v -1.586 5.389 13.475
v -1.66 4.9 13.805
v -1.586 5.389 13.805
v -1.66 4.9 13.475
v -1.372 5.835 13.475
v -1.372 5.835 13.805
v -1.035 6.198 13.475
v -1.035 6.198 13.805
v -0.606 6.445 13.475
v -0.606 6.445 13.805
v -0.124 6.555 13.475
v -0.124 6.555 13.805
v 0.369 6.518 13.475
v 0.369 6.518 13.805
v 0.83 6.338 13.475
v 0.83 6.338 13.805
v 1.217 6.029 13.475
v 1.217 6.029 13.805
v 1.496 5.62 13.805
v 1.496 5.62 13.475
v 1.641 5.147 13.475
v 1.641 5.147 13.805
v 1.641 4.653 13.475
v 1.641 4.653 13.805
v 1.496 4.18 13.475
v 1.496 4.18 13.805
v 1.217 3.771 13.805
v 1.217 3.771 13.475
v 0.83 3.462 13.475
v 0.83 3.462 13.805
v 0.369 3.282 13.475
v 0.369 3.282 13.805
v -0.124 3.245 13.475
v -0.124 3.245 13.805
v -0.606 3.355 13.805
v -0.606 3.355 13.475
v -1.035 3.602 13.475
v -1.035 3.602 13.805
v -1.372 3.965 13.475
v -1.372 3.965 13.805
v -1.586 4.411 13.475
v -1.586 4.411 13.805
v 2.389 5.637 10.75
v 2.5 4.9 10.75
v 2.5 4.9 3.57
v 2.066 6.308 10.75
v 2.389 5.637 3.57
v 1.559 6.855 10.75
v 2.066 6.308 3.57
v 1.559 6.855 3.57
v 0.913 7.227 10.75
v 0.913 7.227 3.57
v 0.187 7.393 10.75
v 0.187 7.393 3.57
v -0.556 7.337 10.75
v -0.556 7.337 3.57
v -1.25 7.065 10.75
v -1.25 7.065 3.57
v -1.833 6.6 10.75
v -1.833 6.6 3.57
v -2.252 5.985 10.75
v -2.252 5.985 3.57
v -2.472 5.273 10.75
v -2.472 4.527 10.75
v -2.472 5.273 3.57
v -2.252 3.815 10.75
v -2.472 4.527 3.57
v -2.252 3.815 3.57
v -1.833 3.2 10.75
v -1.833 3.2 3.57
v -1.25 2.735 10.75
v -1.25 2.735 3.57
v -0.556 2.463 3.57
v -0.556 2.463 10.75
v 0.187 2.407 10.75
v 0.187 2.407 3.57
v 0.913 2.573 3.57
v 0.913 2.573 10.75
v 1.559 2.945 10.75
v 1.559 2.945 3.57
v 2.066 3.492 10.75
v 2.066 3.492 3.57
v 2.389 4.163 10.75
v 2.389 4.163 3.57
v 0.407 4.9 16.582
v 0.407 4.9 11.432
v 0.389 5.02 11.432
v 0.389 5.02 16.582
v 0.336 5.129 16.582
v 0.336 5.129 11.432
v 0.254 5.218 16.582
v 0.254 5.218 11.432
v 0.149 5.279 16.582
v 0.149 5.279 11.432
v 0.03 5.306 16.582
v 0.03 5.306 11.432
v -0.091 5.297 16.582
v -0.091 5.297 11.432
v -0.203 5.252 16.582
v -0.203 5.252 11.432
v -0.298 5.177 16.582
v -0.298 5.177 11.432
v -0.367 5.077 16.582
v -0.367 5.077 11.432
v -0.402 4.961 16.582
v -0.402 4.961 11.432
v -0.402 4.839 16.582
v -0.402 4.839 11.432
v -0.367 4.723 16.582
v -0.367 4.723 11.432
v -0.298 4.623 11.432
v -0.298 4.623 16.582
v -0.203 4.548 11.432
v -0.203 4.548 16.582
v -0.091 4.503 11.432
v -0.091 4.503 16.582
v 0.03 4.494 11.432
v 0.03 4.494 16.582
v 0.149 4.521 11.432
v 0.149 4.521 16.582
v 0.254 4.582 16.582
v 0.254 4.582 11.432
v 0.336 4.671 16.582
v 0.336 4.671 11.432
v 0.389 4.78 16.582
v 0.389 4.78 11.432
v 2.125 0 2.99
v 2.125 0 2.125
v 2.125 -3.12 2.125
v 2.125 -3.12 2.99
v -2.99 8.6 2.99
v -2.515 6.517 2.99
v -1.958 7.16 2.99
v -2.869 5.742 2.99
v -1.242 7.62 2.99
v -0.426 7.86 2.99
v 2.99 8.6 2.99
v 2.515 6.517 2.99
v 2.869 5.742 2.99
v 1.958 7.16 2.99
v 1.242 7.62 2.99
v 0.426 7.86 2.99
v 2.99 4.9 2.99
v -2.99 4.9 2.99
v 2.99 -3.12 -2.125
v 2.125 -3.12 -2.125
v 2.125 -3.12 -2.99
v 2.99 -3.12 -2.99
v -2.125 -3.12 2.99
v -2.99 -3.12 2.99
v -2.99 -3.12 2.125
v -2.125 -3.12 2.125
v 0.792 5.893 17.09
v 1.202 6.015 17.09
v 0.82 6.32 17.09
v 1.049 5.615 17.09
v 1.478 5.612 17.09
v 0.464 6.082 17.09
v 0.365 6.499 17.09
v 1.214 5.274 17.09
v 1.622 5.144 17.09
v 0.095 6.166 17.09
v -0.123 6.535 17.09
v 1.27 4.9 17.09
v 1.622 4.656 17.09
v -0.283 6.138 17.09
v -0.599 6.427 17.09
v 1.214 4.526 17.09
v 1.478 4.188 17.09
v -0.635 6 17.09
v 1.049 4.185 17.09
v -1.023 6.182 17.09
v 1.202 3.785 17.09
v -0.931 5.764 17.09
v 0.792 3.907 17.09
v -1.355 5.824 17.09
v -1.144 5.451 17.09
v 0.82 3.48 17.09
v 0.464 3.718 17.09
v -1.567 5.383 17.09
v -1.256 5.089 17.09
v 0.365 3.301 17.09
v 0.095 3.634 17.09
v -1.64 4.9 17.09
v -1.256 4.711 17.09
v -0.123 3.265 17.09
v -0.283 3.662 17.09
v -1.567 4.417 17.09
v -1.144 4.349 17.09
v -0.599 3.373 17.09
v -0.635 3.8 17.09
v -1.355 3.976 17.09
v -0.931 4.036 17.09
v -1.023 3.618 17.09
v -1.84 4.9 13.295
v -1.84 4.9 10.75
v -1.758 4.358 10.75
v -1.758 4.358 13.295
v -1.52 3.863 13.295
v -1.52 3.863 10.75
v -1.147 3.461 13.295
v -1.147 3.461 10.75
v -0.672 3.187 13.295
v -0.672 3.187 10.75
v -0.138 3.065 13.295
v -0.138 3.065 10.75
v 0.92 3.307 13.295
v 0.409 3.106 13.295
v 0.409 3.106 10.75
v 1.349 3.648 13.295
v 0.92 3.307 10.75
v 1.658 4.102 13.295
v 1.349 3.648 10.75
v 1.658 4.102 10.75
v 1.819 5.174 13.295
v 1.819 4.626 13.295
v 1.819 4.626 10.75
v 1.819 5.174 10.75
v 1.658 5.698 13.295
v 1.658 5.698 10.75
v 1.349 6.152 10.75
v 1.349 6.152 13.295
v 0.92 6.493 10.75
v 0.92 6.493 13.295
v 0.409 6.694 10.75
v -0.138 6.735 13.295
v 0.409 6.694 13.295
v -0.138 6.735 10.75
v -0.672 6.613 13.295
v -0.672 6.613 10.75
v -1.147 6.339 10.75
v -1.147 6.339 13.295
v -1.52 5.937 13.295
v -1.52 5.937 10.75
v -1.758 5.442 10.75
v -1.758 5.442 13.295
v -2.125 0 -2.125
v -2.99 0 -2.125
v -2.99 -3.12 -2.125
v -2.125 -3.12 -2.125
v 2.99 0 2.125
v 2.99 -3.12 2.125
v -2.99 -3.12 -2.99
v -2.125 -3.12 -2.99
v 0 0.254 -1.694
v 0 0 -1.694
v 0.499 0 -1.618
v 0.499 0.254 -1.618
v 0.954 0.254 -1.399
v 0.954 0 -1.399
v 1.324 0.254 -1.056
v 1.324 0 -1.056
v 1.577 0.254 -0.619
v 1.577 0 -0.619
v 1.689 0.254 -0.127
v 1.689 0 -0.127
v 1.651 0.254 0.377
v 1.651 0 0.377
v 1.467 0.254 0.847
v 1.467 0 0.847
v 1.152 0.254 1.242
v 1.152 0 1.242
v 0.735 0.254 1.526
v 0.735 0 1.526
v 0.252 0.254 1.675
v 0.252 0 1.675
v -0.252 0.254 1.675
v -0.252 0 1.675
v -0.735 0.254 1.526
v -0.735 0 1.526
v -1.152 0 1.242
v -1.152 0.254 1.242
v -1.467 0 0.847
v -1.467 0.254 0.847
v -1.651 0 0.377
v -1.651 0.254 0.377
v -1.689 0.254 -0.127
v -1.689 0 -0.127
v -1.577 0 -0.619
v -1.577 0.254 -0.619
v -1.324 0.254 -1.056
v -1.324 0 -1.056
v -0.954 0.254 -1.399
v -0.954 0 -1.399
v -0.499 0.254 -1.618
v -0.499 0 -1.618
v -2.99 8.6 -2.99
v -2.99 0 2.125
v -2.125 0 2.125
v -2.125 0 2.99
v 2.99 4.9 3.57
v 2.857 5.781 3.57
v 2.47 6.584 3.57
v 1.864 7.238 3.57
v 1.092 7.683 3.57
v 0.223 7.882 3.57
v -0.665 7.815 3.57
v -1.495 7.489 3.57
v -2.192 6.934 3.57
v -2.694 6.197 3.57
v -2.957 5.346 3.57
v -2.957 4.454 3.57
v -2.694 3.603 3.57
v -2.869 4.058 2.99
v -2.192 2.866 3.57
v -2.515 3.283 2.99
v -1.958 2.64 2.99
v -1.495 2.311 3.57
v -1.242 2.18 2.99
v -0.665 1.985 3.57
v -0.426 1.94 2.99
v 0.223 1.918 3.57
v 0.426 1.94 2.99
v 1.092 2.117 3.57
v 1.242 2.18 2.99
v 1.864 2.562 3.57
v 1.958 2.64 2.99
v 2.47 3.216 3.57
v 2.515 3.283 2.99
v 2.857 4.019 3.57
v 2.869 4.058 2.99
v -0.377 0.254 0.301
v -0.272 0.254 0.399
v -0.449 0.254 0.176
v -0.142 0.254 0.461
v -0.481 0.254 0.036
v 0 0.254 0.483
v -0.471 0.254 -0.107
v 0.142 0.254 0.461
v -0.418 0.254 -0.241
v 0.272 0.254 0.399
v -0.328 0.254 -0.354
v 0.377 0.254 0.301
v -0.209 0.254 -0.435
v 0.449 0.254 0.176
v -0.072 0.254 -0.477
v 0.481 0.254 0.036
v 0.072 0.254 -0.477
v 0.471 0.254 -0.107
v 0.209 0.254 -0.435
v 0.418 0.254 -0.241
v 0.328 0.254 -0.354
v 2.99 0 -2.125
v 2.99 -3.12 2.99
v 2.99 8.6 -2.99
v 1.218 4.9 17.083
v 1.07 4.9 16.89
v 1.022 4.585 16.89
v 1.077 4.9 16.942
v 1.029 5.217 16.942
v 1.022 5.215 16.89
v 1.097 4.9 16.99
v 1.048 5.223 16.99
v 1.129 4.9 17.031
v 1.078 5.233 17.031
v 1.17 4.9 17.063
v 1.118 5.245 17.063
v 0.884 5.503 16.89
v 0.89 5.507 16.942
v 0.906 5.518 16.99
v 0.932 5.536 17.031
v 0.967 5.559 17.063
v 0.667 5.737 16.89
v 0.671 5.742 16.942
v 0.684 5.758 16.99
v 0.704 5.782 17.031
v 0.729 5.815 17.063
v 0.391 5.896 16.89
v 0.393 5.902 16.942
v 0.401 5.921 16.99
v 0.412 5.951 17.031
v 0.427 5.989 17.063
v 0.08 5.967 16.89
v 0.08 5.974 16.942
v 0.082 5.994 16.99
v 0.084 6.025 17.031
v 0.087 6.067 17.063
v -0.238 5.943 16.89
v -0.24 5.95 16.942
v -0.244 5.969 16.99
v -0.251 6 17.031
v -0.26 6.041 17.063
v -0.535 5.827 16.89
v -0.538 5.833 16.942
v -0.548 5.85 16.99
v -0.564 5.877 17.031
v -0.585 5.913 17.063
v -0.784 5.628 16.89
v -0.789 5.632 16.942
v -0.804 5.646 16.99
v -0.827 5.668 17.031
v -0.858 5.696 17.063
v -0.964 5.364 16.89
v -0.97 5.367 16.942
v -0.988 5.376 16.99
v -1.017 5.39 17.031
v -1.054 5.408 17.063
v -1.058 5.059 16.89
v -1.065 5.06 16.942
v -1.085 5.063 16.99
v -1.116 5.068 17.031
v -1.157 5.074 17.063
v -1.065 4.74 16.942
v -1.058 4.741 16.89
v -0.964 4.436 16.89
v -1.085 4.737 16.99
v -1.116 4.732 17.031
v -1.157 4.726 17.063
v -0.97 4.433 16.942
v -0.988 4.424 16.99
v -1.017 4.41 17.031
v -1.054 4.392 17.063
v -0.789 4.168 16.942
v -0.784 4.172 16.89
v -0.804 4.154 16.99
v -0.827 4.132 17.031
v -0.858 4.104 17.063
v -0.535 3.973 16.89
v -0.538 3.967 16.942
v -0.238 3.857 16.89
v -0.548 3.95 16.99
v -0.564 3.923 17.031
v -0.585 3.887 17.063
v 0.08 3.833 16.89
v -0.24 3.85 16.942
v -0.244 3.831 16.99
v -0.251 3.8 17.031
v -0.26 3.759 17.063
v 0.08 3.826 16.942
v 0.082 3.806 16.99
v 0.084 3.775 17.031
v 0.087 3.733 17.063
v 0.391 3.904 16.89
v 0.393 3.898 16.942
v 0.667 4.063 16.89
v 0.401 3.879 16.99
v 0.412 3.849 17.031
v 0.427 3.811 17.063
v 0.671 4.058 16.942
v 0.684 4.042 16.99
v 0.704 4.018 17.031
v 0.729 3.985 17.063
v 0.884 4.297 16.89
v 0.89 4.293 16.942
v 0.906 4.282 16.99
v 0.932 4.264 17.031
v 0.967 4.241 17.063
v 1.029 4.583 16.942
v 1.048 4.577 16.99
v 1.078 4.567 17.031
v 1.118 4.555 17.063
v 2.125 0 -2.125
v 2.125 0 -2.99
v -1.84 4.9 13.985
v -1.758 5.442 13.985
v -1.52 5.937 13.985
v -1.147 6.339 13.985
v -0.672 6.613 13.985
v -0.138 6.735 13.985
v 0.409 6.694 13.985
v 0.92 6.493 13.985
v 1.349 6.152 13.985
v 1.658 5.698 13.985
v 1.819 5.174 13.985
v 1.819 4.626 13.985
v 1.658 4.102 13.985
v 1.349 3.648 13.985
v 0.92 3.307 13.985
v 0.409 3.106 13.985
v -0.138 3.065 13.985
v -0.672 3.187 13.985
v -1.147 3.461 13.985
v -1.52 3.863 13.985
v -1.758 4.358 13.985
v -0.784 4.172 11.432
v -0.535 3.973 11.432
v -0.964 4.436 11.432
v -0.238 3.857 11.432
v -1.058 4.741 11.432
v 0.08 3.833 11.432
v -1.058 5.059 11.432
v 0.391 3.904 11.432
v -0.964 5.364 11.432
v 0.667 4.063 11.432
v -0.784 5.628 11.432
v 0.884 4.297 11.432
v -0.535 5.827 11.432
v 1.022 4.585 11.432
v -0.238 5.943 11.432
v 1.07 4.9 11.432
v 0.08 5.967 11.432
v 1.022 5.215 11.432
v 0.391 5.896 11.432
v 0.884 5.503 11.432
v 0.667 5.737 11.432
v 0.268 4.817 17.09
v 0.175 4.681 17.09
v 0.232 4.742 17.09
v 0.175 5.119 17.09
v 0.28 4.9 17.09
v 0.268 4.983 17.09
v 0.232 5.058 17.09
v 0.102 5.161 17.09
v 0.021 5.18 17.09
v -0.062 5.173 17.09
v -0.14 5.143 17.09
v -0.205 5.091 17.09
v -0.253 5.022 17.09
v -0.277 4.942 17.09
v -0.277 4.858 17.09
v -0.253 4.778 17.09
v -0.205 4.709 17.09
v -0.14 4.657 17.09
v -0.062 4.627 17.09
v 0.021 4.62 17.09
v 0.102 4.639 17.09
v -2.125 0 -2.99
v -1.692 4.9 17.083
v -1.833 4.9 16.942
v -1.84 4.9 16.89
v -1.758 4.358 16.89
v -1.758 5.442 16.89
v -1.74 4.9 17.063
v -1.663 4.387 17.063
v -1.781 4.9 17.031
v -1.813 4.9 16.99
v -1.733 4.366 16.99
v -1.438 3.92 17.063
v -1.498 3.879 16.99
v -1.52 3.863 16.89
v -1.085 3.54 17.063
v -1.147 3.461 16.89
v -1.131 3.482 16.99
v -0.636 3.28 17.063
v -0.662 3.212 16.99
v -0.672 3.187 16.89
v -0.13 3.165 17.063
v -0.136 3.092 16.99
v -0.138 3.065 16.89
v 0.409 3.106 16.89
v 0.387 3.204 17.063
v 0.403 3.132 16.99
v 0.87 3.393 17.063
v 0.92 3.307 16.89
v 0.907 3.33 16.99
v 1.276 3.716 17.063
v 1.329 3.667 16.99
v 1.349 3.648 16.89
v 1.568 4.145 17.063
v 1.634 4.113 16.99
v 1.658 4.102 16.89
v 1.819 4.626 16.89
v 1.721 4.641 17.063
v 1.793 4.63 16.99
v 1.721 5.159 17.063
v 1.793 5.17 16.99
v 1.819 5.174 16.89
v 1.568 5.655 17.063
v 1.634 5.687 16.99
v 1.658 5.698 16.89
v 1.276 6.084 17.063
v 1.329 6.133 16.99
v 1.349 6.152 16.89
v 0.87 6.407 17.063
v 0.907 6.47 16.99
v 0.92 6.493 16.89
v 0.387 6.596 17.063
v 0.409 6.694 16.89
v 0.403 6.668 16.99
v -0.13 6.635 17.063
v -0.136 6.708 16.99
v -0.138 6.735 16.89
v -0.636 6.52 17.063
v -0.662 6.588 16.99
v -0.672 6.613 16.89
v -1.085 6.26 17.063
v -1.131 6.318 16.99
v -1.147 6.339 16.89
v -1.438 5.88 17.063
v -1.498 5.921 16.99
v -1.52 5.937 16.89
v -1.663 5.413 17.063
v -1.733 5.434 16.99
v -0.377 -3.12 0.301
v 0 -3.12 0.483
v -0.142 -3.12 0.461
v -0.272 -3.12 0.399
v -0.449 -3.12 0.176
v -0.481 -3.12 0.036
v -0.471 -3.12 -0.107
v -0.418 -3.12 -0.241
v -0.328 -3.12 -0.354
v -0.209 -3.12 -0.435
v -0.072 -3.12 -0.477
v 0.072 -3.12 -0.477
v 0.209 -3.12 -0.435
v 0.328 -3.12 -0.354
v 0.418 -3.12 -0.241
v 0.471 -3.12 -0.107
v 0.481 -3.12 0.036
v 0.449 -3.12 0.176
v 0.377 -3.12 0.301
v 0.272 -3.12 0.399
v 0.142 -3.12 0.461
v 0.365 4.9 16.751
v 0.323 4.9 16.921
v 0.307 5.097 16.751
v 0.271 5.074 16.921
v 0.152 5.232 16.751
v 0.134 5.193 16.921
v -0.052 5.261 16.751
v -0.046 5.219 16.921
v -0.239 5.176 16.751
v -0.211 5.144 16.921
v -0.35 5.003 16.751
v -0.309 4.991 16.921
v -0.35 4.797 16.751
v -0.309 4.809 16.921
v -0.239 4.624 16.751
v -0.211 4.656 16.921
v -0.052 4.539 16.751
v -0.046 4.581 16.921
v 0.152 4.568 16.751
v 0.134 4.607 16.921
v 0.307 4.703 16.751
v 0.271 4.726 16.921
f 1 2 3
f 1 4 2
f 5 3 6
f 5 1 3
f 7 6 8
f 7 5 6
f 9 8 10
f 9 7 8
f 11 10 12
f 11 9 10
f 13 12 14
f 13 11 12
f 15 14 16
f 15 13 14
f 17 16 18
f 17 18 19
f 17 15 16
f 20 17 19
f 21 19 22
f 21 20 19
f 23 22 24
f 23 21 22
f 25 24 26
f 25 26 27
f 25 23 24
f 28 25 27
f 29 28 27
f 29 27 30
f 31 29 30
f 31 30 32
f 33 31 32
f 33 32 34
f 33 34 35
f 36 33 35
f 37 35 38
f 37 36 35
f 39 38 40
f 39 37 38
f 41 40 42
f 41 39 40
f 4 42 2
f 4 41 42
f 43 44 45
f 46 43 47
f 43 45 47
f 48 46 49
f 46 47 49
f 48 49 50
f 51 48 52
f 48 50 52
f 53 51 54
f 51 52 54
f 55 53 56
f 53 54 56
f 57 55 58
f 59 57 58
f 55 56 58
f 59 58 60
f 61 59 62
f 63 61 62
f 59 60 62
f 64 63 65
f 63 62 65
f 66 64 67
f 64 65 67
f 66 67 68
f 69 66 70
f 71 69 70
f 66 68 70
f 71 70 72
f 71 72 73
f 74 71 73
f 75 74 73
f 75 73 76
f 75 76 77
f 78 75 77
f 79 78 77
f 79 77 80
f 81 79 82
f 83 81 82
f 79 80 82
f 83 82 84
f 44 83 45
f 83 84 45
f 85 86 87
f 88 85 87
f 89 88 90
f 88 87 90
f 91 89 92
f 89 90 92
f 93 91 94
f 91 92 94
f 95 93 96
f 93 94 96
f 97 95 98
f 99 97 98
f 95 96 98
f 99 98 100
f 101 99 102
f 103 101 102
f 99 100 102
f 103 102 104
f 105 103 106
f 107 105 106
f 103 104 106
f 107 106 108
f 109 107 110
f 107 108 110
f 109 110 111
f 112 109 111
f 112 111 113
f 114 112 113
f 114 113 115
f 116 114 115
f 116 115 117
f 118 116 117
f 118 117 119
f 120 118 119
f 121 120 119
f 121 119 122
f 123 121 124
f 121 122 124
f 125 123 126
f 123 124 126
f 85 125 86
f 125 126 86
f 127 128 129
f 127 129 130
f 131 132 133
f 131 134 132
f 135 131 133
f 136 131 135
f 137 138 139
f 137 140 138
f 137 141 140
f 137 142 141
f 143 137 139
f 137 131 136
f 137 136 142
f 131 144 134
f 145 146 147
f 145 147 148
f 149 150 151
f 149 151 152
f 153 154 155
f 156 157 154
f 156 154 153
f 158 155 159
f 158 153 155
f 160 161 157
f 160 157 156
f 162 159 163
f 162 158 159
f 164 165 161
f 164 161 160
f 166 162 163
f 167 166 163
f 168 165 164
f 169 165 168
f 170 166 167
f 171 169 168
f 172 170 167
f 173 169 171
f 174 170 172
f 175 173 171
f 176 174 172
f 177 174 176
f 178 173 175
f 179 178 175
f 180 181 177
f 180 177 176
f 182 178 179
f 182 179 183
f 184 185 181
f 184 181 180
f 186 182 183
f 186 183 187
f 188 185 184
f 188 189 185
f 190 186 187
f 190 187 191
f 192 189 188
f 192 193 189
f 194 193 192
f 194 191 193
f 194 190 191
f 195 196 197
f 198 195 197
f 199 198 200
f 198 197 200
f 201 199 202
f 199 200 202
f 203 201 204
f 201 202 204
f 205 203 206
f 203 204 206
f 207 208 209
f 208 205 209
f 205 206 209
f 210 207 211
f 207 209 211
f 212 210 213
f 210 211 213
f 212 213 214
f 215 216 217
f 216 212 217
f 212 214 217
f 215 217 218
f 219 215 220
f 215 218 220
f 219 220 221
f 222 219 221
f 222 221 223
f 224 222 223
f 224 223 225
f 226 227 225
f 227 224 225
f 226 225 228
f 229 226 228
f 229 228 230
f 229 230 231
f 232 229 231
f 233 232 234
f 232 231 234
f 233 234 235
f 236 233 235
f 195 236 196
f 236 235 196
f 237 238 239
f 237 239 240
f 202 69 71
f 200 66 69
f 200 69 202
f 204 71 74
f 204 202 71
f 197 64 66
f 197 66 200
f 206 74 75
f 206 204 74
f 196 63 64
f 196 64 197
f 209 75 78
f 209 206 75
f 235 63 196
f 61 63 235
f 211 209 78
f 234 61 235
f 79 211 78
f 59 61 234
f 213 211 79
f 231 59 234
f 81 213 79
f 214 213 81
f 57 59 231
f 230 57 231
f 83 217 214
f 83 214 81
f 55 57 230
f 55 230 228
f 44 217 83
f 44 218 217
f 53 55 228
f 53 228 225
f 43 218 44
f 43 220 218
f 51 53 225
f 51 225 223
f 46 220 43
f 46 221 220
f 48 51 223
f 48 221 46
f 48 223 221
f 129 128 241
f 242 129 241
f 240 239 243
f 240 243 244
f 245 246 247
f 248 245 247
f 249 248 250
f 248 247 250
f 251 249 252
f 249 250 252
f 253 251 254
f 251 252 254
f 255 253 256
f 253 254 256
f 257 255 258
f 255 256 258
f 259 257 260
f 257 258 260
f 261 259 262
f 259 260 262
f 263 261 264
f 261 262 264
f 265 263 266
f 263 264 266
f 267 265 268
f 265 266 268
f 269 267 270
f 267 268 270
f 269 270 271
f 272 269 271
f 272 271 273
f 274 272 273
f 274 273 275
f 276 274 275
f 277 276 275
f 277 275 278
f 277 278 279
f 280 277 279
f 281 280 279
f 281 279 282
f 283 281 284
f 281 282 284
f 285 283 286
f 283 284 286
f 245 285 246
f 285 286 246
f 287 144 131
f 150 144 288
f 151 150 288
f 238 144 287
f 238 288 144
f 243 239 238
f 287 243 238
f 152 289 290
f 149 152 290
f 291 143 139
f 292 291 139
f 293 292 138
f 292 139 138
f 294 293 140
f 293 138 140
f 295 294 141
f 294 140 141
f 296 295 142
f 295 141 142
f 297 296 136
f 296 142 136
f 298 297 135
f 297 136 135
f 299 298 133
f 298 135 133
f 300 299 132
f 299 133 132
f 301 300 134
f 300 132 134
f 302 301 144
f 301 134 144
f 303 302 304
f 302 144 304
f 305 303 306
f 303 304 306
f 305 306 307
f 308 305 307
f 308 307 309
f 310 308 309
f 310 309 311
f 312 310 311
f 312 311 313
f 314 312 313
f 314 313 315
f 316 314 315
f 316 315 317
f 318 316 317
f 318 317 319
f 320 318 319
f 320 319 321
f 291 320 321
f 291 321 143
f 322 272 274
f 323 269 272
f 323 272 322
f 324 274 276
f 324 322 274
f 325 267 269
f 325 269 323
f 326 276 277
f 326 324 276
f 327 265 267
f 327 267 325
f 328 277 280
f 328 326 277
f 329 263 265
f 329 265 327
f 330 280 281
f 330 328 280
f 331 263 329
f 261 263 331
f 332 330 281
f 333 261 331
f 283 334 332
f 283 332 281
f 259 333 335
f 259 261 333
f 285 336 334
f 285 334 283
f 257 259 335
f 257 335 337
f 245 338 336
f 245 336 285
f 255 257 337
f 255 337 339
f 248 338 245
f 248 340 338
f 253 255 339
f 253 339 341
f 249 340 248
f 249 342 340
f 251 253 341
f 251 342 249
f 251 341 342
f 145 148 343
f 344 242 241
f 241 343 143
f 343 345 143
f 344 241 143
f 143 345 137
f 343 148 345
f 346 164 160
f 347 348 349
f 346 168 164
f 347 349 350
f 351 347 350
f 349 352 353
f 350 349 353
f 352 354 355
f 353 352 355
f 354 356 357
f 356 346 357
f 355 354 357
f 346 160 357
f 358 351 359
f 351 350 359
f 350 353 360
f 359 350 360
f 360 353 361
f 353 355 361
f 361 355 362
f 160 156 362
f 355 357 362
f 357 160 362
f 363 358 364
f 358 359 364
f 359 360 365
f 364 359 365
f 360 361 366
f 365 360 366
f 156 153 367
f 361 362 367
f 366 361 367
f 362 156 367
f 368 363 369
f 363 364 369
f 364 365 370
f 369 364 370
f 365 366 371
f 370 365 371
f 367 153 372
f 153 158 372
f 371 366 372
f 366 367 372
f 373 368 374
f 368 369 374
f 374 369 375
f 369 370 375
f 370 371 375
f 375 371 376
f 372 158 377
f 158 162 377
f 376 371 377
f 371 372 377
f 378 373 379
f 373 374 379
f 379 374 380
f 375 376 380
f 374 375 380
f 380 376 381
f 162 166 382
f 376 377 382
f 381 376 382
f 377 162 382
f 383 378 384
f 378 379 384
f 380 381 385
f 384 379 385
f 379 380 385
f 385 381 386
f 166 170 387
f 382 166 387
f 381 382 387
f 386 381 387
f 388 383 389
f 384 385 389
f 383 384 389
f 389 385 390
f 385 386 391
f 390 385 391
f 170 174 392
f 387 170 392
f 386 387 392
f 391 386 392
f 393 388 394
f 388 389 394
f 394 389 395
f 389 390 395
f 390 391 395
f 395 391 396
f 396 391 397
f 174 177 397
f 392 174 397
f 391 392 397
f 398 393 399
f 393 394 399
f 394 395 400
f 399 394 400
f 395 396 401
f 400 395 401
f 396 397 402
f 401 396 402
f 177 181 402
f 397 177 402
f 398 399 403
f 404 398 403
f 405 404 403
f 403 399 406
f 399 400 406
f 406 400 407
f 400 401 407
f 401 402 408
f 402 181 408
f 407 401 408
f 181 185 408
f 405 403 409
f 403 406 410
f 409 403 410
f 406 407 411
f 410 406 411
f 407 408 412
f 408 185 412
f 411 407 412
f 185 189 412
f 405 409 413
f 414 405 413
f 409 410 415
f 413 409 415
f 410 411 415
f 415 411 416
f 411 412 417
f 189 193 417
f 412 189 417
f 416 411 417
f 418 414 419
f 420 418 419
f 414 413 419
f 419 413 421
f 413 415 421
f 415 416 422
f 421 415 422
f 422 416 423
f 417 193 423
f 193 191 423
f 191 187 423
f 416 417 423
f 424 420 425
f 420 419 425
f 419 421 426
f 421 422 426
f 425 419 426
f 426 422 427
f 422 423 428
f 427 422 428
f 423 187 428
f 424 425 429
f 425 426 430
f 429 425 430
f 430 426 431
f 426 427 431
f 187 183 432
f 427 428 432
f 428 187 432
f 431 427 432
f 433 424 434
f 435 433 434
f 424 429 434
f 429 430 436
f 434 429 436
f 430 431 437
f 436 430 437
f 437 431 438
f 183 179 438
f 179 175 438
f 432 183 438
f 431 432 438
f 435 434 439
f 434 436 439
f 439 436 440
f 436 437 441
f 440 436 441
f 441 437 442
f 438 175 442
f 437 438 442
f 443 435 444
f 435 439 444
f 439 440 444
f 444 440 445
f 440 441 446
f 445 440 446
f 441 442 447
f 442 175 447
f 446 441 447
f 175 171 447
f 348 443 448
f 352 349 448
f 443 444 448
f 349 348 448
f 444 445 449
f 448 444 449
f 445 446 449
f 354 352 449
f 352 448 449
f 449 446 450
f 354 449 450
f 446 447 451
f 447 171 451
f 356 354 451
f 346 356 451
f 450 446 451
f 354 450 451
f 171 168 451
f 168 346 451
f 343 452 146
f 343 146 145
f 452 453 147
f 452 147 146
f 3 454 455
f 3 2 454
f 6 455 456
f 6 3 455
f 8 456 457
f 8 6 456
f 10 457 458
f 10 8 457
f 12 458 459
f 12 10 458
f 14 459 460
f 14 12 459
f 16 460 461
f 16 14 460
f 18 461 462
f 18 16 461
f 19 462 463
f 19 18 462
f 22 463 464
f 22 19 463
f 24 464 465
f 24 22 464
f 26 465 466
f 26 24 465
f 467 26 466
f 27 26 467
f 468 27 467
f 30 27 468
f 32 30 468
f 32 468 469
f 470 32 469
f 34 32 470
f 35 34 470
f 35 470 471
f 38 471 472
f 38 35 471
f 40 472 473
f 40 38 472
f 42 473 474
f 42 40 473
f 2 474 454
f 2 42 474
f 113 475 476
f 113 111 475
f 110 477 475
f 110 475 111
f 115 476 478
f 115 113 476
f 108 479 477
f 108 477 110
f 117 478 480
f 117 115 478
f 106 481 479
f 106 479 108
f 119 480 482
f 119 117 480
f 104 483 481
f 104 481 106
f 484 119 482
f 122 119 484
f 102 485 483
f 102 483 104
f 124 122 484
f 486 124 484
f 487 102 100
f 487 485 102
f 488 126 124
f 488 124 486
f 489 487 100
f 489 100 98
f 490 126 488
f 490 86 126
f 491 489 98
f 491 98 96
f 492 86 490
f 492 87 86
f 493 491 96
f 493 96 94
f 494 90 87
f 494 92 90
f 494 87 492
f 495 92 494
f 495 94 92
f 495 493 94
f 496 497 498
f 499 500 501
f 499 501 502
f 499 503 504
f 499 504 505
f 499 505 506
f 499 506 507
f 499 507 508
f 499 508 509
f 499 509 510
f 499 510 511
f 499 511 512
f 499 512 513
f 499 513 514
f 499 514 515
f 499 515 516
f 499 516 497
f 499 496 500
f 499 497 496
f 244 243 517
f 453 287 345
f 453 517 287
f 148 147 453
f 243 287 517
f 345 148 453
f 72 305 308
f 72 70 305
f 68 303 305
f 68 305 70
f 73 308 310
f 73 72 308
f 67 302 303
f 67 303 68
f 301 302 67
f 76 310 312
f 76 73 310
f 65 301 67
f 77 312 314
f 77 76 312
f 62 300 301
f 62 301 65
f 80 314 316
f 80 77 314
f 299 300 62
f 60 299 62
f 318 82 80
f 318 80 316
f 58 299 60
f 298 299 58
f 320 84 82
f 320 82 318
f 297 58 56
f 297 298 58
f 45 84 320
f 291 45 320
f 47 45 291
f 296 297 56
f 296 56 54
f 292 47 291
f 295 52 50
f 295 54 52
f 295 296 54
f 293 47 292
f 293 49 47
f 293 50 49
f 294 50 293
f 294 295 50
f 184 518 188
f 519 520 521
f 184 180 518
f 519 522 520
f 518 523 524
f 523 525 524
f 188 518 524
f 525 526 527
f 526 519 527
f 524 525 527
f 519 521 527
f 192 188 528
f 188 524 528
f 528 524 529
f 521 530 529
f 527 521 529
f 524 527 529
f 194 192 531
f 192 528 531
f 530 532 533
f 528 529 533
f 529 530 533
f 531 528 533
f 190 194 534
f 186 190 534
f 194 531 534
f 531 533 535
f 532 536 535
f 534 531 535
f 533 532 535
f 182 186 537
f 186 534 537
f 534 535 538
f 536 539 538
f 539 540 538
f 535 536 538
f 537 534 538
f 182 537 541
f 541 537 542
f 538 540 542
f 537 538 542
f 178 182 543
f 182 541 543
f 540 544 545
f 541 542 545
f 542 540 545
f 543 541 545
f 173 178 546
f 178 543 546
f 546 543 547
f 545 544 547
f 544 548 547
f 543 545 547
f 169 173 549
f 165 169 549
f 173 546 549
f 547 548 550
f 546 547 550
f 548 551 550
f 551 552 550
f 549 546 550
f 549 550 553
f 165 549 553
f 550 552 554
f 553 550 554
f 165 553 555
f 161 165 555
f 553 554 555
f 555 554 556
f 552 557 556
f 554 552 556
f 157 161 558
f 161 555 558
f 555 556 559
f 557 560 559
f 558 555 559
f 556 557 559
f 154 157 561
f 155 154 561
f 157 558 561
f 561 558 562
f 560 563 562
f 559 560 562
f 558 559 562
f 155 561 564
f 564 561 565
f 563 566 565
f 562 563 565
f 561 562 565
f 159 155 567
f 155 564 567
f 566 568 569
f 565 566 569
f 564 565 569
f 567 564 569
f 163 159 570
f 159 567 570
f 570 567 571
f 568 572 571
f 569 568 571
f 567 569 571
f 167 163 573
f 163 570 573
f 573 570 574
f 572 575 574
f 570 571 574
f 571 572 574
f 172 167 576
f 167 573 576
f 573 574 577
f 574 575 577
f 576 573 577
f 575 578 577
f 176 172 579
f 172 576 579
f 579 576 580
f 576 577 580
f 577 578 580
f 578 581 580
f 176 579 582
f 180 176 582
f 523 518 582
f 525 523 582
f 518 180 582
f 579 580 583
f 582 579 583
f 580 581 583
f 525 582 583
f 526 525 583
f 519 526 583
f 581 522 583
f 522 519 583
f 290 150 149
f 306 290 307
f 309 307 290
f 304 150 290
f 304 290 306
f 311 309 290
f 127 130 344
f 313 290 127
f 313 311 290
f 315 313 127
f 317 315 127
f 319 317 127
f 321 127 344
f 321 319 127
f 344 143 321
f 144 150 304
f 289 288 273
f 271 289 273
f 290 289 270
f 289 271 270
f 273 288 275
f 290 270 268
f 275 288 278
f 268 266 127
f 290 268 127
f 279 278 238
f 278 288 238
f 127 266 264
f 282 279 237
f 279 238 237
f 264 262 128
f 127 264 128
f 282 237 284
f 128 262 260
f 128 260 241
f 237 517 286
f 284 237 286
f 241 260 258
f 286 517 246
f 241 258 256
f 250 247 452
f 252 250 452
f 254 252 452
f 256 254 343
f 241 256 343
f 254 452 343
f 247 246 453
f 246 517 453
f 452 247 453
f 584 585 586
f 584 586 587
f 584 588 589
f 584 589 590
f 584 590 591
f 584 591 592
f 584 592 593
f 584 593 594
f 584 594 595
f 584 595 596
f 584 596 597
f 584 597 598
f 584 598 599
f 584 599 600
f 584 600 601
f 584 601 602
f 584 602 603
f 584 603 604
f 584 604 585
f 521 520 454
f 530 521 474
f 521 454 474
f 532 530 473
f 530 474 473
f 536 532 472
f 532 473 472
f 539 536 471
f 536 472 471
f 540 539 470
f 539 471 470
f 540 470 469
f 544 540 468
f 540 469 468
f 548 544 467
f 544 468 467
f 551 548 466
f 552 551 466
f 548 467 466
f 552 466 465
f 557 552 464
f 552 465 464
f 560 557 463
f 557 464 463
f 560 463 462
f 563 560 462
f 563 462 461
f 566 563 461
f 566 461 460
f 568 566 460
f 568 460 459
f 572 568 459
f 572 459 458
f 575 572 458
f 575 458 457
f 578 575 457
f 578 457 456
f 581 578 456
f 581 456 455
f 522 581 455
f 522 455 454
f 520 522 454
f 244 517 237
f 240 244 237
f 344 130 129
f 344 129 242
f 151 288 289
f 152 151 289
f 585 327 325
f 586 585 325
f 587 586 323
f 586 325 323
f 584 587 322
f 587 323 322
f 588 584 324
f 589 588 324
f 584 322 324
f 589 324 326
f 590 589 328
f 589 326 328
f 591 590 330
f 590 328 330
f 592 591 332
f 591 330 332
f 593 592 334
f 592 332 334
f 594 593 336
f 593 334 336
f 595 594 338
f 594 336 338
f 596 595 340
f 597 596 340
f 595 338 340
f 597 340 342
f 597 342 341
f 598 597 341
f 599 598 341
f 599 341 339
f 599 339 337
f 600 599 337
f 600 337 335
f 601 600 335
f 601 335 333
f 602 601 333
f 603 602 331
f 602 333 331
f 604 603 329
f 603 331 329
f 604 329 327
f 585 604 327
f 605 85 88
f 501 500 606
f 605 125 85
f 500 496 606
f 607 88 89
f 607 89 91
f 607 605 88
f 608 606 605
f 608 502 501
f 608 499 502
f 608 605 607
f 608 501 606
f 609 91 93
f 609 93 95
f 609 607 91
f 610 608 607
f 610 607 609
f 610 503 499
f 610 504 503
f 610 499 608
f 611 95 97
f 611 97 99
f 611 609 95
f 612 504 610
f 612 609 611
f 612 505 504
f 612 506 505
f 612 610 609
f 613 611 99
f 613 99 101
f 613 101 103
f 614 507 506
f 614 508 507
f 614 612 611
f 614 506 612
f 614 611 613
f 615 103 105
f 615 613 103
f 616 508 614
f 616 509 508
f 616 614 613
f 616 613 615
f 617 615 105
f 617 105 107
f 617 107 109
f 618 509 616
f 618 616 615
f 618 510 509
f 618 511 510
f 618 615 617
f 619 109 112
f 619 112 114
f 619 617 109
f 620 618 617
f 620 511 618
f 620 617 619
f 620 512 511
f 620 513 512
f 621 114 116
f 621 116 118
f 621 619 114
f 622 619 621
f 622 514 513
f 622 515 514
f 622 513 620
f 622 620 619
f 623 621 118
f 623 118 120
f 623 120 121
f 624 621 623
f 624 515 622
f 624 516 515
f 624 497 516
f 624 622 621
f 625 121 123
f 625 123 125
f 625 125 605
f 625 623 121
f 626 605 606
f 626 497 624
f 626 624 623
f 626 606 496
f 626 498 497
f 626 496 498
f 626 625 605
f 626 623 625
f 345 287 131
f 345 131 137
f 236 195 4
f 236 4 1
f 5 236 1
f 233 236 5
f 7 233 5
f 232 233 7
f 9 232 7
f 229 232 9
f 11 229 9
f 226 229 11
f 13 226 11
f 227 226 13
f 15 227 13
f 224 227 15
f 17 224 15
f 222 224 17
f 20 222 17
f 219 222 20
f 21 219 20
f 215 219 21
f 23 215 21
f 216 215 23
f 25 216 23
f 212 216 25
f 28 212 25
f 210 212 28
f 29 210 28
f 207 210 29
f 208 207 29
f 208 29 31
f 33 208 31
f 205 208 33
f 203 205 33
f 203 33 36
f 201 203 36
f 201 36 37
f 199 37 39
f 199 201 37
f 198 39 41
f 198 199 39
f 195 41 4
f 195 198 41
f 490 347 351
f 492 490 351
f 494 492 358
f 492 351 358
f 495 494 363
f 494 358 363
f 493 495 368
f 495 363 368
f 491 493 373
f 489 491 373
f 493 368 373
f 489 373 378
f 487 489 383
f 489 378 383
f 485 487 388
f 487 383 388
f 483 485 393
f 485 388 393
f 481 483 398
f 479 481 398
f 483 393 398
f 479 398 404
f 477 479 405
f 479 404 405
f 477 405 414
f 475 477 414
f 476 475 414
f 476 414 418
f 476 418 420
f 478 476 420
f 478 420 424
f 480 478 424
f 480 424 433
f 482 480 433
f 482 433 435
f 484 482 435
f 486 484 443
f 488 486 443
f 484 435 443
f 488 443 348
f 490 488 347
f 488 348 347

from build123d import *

# Parameters (mm, degrees)
SKETCH1_W          = 5.98
SKETCH1_H          = 5.98
EXTRUDE1_DEPTH     = 8.6
SKETCH3_W          = 0.865
SKETCH3_H          = 0.865
EXTRUDE3_DEPTH     = 3.12
SKETCH4_R          = 1.693605641
CUT_EXTRUDE1_DEPTH = 0.254
SKETCH5_R          = 0.4826
EXTRUDE4_DEPTH     = 3.374
SKETCH6_R          = 2.99
EXTRUDE5_DEPTH     = 0.58
ESQUISSE1_R        = 2.5
BOSS_EXTRU_1_DEPTH = 7.18
SKETCH7_R          = 1.84
EXTRUDE6_DEPTH     = 6.34
SKETCH9_R          = 1.07
CUT_EXTRUDE2_DEPTH = 5.658092827
SKETCH10_R         = 0.406972167
EXTRUDE7_DEPTH     = 5.658092827
CHAMFER1_SIZE      = 0.508
CHAMFER1_SIZE2     = 0.126658625
CONG_1_R           = 0.2


with BuildPart() as part:
    # Sketch1 → Extrude1 (new body)
    with BuildSketch(Plane(origin=(0, 0, 0), x_dir=(1, 0, 0), z_dir=(0, 1, 0))):
        Rectangle(SKETCH1_W, SKETCH1_H)
    extrude(amount=EXTRUDE1_DEPTH)

    # Sketch3 → Extrude3 (add)
    with BuildSketch(Plane.XZ):
        with Locations((2.5575, 2.5575)):
            Rectangle(SKETCH3_W, SKETCH3_H)
        with Locations((2.5575, -2.5575)):
            Rectangle(SKETCH3_W, SKETCH3_H)
        with Locations((-2.5575, -2.5575)):
            Rectangle(SKETCH3_W, SKETCH3_H)
        with Locations((-2.5575, 2.5575)):
            Rectangle(SKETCH3_W, SKETCH3_H)
    extrude(amount=EXTRUDE3_DEPTH)

    # Sketch4 → Cut-Extrude1 (cut)
    with BuildSketch(Plane.XZ):
        with Locations(Location((0, 0, 0), (0, 0, 270))):
            Circle(SKETCH4_R)
    extrude(amount=-CUT_EXTRUDE1_DEPTH, mode=Mode.SUBTRACT)

    # Sketch5 → Extrude4 (add)
    with BuildSketch(Plane.XZ.offset(-0.254)):
        with Locations(Location((0, 0, 0), (0, 0, 90))):
            Circle(SKETCH5_R)
    extrude(amount=EXTRUDE4_DEPTH)

    # Sketch6 → Extrude5 (add)
    with BuildSketch(Plane.XY.offset(2.99)):
        with Locations((0, 4.9)):
            Circle(SKETCH6_R)
    extrude(amount=EXTRUDE5_DEPTH)

    # Esquisse1 → Boss.-Extru.1 (add)
    with BuildSketch(Plane.XY.offset(3.57)):
        with Locations((0, 4.9)):
            Circle(ESQUISSE1_R)
    extrude(amount=BOSS_EXTRU_1_DEPTH)

    # Sketch7 → Extrude6 (add)
    with BuildSketch(Plane.XY.offset(10.75)):
        with Locations(Location((0, 4.9, 0), (0, 0, 180))):
            Circle(SKETCH7_R)
    extrude(amount=EXTRUDE6_DEPTH)

    # Esquisse2 → Enlèvement de matière-Révolution1 (revolve, cut)
    with BuildSketch(Plane(origin=(0, 4.9, 0), x_dir=(-1, 0, 0), z_dir=(0, 1, 0)), mode=Mode.PRIVATE) as enl_vement_de_mati_re_r_volution1_sk:
        Polygon((-2.367106781, 14.512106781), (-1.66, 13.805), (-1.66, 13.475), (-2.367106781, 12.767893219), align=None)
    revolve(enl_vement_de_mati_re_r_volution1_sk.sketch.rotate(Axis((0, 4.9, 17.09), (0, 0, -1)), 180), axis=Axis((0, 4.9, 17.09), (0, 0, -1)), mode=Mode.SUBTRACT)

    # Sketch9 → Cut-Extrude2 (cut)
    with BuildSketch(Plane.XY.offset(17.09)):
        with Locations((0, 4.9)):
            Circle(SKETCH9_R)
    extrude(amount=-CUT_EXTRUDE2_DEPTH, mode=Mode.SUBTRACT)

    # Sketch10 → Extrude7 (add)
    with BuildSketch(Plane.XY.offset(11.431907173)):
        with Locations((0, 4.9)):
            Circle(SKETCH10_R)
    extrude(amount=EXTRUDE7_DEPTH)

    # Chamfer1
    chamfer1_edges = [part.edges().sort_by_distance(p)[0] for p in [
        (-0.406972167, 4.9, 17.09),
    ]]
    chamfer1_side = [part.faces().sort_by_distance(p)[0] for p in [
        (-0.406972167, 4.9, 14.260953587),
    ]]
    chamfer(chamfer1_edges, length=CHAMFER1_SIZE, length2=CHAMFER1_SIZE2, reference=chamfer1_side[0])

    # Congé1
    cong_1_edges = [part.edges().sort_by_distance(p)[0] for p in [
        (1.84, 4.9, 17.09),
        (-1.07, 4.9, 17.09),
    ]]
    fillet(cong_1_edges, radius=CONG_1_R)


solid = part.part
